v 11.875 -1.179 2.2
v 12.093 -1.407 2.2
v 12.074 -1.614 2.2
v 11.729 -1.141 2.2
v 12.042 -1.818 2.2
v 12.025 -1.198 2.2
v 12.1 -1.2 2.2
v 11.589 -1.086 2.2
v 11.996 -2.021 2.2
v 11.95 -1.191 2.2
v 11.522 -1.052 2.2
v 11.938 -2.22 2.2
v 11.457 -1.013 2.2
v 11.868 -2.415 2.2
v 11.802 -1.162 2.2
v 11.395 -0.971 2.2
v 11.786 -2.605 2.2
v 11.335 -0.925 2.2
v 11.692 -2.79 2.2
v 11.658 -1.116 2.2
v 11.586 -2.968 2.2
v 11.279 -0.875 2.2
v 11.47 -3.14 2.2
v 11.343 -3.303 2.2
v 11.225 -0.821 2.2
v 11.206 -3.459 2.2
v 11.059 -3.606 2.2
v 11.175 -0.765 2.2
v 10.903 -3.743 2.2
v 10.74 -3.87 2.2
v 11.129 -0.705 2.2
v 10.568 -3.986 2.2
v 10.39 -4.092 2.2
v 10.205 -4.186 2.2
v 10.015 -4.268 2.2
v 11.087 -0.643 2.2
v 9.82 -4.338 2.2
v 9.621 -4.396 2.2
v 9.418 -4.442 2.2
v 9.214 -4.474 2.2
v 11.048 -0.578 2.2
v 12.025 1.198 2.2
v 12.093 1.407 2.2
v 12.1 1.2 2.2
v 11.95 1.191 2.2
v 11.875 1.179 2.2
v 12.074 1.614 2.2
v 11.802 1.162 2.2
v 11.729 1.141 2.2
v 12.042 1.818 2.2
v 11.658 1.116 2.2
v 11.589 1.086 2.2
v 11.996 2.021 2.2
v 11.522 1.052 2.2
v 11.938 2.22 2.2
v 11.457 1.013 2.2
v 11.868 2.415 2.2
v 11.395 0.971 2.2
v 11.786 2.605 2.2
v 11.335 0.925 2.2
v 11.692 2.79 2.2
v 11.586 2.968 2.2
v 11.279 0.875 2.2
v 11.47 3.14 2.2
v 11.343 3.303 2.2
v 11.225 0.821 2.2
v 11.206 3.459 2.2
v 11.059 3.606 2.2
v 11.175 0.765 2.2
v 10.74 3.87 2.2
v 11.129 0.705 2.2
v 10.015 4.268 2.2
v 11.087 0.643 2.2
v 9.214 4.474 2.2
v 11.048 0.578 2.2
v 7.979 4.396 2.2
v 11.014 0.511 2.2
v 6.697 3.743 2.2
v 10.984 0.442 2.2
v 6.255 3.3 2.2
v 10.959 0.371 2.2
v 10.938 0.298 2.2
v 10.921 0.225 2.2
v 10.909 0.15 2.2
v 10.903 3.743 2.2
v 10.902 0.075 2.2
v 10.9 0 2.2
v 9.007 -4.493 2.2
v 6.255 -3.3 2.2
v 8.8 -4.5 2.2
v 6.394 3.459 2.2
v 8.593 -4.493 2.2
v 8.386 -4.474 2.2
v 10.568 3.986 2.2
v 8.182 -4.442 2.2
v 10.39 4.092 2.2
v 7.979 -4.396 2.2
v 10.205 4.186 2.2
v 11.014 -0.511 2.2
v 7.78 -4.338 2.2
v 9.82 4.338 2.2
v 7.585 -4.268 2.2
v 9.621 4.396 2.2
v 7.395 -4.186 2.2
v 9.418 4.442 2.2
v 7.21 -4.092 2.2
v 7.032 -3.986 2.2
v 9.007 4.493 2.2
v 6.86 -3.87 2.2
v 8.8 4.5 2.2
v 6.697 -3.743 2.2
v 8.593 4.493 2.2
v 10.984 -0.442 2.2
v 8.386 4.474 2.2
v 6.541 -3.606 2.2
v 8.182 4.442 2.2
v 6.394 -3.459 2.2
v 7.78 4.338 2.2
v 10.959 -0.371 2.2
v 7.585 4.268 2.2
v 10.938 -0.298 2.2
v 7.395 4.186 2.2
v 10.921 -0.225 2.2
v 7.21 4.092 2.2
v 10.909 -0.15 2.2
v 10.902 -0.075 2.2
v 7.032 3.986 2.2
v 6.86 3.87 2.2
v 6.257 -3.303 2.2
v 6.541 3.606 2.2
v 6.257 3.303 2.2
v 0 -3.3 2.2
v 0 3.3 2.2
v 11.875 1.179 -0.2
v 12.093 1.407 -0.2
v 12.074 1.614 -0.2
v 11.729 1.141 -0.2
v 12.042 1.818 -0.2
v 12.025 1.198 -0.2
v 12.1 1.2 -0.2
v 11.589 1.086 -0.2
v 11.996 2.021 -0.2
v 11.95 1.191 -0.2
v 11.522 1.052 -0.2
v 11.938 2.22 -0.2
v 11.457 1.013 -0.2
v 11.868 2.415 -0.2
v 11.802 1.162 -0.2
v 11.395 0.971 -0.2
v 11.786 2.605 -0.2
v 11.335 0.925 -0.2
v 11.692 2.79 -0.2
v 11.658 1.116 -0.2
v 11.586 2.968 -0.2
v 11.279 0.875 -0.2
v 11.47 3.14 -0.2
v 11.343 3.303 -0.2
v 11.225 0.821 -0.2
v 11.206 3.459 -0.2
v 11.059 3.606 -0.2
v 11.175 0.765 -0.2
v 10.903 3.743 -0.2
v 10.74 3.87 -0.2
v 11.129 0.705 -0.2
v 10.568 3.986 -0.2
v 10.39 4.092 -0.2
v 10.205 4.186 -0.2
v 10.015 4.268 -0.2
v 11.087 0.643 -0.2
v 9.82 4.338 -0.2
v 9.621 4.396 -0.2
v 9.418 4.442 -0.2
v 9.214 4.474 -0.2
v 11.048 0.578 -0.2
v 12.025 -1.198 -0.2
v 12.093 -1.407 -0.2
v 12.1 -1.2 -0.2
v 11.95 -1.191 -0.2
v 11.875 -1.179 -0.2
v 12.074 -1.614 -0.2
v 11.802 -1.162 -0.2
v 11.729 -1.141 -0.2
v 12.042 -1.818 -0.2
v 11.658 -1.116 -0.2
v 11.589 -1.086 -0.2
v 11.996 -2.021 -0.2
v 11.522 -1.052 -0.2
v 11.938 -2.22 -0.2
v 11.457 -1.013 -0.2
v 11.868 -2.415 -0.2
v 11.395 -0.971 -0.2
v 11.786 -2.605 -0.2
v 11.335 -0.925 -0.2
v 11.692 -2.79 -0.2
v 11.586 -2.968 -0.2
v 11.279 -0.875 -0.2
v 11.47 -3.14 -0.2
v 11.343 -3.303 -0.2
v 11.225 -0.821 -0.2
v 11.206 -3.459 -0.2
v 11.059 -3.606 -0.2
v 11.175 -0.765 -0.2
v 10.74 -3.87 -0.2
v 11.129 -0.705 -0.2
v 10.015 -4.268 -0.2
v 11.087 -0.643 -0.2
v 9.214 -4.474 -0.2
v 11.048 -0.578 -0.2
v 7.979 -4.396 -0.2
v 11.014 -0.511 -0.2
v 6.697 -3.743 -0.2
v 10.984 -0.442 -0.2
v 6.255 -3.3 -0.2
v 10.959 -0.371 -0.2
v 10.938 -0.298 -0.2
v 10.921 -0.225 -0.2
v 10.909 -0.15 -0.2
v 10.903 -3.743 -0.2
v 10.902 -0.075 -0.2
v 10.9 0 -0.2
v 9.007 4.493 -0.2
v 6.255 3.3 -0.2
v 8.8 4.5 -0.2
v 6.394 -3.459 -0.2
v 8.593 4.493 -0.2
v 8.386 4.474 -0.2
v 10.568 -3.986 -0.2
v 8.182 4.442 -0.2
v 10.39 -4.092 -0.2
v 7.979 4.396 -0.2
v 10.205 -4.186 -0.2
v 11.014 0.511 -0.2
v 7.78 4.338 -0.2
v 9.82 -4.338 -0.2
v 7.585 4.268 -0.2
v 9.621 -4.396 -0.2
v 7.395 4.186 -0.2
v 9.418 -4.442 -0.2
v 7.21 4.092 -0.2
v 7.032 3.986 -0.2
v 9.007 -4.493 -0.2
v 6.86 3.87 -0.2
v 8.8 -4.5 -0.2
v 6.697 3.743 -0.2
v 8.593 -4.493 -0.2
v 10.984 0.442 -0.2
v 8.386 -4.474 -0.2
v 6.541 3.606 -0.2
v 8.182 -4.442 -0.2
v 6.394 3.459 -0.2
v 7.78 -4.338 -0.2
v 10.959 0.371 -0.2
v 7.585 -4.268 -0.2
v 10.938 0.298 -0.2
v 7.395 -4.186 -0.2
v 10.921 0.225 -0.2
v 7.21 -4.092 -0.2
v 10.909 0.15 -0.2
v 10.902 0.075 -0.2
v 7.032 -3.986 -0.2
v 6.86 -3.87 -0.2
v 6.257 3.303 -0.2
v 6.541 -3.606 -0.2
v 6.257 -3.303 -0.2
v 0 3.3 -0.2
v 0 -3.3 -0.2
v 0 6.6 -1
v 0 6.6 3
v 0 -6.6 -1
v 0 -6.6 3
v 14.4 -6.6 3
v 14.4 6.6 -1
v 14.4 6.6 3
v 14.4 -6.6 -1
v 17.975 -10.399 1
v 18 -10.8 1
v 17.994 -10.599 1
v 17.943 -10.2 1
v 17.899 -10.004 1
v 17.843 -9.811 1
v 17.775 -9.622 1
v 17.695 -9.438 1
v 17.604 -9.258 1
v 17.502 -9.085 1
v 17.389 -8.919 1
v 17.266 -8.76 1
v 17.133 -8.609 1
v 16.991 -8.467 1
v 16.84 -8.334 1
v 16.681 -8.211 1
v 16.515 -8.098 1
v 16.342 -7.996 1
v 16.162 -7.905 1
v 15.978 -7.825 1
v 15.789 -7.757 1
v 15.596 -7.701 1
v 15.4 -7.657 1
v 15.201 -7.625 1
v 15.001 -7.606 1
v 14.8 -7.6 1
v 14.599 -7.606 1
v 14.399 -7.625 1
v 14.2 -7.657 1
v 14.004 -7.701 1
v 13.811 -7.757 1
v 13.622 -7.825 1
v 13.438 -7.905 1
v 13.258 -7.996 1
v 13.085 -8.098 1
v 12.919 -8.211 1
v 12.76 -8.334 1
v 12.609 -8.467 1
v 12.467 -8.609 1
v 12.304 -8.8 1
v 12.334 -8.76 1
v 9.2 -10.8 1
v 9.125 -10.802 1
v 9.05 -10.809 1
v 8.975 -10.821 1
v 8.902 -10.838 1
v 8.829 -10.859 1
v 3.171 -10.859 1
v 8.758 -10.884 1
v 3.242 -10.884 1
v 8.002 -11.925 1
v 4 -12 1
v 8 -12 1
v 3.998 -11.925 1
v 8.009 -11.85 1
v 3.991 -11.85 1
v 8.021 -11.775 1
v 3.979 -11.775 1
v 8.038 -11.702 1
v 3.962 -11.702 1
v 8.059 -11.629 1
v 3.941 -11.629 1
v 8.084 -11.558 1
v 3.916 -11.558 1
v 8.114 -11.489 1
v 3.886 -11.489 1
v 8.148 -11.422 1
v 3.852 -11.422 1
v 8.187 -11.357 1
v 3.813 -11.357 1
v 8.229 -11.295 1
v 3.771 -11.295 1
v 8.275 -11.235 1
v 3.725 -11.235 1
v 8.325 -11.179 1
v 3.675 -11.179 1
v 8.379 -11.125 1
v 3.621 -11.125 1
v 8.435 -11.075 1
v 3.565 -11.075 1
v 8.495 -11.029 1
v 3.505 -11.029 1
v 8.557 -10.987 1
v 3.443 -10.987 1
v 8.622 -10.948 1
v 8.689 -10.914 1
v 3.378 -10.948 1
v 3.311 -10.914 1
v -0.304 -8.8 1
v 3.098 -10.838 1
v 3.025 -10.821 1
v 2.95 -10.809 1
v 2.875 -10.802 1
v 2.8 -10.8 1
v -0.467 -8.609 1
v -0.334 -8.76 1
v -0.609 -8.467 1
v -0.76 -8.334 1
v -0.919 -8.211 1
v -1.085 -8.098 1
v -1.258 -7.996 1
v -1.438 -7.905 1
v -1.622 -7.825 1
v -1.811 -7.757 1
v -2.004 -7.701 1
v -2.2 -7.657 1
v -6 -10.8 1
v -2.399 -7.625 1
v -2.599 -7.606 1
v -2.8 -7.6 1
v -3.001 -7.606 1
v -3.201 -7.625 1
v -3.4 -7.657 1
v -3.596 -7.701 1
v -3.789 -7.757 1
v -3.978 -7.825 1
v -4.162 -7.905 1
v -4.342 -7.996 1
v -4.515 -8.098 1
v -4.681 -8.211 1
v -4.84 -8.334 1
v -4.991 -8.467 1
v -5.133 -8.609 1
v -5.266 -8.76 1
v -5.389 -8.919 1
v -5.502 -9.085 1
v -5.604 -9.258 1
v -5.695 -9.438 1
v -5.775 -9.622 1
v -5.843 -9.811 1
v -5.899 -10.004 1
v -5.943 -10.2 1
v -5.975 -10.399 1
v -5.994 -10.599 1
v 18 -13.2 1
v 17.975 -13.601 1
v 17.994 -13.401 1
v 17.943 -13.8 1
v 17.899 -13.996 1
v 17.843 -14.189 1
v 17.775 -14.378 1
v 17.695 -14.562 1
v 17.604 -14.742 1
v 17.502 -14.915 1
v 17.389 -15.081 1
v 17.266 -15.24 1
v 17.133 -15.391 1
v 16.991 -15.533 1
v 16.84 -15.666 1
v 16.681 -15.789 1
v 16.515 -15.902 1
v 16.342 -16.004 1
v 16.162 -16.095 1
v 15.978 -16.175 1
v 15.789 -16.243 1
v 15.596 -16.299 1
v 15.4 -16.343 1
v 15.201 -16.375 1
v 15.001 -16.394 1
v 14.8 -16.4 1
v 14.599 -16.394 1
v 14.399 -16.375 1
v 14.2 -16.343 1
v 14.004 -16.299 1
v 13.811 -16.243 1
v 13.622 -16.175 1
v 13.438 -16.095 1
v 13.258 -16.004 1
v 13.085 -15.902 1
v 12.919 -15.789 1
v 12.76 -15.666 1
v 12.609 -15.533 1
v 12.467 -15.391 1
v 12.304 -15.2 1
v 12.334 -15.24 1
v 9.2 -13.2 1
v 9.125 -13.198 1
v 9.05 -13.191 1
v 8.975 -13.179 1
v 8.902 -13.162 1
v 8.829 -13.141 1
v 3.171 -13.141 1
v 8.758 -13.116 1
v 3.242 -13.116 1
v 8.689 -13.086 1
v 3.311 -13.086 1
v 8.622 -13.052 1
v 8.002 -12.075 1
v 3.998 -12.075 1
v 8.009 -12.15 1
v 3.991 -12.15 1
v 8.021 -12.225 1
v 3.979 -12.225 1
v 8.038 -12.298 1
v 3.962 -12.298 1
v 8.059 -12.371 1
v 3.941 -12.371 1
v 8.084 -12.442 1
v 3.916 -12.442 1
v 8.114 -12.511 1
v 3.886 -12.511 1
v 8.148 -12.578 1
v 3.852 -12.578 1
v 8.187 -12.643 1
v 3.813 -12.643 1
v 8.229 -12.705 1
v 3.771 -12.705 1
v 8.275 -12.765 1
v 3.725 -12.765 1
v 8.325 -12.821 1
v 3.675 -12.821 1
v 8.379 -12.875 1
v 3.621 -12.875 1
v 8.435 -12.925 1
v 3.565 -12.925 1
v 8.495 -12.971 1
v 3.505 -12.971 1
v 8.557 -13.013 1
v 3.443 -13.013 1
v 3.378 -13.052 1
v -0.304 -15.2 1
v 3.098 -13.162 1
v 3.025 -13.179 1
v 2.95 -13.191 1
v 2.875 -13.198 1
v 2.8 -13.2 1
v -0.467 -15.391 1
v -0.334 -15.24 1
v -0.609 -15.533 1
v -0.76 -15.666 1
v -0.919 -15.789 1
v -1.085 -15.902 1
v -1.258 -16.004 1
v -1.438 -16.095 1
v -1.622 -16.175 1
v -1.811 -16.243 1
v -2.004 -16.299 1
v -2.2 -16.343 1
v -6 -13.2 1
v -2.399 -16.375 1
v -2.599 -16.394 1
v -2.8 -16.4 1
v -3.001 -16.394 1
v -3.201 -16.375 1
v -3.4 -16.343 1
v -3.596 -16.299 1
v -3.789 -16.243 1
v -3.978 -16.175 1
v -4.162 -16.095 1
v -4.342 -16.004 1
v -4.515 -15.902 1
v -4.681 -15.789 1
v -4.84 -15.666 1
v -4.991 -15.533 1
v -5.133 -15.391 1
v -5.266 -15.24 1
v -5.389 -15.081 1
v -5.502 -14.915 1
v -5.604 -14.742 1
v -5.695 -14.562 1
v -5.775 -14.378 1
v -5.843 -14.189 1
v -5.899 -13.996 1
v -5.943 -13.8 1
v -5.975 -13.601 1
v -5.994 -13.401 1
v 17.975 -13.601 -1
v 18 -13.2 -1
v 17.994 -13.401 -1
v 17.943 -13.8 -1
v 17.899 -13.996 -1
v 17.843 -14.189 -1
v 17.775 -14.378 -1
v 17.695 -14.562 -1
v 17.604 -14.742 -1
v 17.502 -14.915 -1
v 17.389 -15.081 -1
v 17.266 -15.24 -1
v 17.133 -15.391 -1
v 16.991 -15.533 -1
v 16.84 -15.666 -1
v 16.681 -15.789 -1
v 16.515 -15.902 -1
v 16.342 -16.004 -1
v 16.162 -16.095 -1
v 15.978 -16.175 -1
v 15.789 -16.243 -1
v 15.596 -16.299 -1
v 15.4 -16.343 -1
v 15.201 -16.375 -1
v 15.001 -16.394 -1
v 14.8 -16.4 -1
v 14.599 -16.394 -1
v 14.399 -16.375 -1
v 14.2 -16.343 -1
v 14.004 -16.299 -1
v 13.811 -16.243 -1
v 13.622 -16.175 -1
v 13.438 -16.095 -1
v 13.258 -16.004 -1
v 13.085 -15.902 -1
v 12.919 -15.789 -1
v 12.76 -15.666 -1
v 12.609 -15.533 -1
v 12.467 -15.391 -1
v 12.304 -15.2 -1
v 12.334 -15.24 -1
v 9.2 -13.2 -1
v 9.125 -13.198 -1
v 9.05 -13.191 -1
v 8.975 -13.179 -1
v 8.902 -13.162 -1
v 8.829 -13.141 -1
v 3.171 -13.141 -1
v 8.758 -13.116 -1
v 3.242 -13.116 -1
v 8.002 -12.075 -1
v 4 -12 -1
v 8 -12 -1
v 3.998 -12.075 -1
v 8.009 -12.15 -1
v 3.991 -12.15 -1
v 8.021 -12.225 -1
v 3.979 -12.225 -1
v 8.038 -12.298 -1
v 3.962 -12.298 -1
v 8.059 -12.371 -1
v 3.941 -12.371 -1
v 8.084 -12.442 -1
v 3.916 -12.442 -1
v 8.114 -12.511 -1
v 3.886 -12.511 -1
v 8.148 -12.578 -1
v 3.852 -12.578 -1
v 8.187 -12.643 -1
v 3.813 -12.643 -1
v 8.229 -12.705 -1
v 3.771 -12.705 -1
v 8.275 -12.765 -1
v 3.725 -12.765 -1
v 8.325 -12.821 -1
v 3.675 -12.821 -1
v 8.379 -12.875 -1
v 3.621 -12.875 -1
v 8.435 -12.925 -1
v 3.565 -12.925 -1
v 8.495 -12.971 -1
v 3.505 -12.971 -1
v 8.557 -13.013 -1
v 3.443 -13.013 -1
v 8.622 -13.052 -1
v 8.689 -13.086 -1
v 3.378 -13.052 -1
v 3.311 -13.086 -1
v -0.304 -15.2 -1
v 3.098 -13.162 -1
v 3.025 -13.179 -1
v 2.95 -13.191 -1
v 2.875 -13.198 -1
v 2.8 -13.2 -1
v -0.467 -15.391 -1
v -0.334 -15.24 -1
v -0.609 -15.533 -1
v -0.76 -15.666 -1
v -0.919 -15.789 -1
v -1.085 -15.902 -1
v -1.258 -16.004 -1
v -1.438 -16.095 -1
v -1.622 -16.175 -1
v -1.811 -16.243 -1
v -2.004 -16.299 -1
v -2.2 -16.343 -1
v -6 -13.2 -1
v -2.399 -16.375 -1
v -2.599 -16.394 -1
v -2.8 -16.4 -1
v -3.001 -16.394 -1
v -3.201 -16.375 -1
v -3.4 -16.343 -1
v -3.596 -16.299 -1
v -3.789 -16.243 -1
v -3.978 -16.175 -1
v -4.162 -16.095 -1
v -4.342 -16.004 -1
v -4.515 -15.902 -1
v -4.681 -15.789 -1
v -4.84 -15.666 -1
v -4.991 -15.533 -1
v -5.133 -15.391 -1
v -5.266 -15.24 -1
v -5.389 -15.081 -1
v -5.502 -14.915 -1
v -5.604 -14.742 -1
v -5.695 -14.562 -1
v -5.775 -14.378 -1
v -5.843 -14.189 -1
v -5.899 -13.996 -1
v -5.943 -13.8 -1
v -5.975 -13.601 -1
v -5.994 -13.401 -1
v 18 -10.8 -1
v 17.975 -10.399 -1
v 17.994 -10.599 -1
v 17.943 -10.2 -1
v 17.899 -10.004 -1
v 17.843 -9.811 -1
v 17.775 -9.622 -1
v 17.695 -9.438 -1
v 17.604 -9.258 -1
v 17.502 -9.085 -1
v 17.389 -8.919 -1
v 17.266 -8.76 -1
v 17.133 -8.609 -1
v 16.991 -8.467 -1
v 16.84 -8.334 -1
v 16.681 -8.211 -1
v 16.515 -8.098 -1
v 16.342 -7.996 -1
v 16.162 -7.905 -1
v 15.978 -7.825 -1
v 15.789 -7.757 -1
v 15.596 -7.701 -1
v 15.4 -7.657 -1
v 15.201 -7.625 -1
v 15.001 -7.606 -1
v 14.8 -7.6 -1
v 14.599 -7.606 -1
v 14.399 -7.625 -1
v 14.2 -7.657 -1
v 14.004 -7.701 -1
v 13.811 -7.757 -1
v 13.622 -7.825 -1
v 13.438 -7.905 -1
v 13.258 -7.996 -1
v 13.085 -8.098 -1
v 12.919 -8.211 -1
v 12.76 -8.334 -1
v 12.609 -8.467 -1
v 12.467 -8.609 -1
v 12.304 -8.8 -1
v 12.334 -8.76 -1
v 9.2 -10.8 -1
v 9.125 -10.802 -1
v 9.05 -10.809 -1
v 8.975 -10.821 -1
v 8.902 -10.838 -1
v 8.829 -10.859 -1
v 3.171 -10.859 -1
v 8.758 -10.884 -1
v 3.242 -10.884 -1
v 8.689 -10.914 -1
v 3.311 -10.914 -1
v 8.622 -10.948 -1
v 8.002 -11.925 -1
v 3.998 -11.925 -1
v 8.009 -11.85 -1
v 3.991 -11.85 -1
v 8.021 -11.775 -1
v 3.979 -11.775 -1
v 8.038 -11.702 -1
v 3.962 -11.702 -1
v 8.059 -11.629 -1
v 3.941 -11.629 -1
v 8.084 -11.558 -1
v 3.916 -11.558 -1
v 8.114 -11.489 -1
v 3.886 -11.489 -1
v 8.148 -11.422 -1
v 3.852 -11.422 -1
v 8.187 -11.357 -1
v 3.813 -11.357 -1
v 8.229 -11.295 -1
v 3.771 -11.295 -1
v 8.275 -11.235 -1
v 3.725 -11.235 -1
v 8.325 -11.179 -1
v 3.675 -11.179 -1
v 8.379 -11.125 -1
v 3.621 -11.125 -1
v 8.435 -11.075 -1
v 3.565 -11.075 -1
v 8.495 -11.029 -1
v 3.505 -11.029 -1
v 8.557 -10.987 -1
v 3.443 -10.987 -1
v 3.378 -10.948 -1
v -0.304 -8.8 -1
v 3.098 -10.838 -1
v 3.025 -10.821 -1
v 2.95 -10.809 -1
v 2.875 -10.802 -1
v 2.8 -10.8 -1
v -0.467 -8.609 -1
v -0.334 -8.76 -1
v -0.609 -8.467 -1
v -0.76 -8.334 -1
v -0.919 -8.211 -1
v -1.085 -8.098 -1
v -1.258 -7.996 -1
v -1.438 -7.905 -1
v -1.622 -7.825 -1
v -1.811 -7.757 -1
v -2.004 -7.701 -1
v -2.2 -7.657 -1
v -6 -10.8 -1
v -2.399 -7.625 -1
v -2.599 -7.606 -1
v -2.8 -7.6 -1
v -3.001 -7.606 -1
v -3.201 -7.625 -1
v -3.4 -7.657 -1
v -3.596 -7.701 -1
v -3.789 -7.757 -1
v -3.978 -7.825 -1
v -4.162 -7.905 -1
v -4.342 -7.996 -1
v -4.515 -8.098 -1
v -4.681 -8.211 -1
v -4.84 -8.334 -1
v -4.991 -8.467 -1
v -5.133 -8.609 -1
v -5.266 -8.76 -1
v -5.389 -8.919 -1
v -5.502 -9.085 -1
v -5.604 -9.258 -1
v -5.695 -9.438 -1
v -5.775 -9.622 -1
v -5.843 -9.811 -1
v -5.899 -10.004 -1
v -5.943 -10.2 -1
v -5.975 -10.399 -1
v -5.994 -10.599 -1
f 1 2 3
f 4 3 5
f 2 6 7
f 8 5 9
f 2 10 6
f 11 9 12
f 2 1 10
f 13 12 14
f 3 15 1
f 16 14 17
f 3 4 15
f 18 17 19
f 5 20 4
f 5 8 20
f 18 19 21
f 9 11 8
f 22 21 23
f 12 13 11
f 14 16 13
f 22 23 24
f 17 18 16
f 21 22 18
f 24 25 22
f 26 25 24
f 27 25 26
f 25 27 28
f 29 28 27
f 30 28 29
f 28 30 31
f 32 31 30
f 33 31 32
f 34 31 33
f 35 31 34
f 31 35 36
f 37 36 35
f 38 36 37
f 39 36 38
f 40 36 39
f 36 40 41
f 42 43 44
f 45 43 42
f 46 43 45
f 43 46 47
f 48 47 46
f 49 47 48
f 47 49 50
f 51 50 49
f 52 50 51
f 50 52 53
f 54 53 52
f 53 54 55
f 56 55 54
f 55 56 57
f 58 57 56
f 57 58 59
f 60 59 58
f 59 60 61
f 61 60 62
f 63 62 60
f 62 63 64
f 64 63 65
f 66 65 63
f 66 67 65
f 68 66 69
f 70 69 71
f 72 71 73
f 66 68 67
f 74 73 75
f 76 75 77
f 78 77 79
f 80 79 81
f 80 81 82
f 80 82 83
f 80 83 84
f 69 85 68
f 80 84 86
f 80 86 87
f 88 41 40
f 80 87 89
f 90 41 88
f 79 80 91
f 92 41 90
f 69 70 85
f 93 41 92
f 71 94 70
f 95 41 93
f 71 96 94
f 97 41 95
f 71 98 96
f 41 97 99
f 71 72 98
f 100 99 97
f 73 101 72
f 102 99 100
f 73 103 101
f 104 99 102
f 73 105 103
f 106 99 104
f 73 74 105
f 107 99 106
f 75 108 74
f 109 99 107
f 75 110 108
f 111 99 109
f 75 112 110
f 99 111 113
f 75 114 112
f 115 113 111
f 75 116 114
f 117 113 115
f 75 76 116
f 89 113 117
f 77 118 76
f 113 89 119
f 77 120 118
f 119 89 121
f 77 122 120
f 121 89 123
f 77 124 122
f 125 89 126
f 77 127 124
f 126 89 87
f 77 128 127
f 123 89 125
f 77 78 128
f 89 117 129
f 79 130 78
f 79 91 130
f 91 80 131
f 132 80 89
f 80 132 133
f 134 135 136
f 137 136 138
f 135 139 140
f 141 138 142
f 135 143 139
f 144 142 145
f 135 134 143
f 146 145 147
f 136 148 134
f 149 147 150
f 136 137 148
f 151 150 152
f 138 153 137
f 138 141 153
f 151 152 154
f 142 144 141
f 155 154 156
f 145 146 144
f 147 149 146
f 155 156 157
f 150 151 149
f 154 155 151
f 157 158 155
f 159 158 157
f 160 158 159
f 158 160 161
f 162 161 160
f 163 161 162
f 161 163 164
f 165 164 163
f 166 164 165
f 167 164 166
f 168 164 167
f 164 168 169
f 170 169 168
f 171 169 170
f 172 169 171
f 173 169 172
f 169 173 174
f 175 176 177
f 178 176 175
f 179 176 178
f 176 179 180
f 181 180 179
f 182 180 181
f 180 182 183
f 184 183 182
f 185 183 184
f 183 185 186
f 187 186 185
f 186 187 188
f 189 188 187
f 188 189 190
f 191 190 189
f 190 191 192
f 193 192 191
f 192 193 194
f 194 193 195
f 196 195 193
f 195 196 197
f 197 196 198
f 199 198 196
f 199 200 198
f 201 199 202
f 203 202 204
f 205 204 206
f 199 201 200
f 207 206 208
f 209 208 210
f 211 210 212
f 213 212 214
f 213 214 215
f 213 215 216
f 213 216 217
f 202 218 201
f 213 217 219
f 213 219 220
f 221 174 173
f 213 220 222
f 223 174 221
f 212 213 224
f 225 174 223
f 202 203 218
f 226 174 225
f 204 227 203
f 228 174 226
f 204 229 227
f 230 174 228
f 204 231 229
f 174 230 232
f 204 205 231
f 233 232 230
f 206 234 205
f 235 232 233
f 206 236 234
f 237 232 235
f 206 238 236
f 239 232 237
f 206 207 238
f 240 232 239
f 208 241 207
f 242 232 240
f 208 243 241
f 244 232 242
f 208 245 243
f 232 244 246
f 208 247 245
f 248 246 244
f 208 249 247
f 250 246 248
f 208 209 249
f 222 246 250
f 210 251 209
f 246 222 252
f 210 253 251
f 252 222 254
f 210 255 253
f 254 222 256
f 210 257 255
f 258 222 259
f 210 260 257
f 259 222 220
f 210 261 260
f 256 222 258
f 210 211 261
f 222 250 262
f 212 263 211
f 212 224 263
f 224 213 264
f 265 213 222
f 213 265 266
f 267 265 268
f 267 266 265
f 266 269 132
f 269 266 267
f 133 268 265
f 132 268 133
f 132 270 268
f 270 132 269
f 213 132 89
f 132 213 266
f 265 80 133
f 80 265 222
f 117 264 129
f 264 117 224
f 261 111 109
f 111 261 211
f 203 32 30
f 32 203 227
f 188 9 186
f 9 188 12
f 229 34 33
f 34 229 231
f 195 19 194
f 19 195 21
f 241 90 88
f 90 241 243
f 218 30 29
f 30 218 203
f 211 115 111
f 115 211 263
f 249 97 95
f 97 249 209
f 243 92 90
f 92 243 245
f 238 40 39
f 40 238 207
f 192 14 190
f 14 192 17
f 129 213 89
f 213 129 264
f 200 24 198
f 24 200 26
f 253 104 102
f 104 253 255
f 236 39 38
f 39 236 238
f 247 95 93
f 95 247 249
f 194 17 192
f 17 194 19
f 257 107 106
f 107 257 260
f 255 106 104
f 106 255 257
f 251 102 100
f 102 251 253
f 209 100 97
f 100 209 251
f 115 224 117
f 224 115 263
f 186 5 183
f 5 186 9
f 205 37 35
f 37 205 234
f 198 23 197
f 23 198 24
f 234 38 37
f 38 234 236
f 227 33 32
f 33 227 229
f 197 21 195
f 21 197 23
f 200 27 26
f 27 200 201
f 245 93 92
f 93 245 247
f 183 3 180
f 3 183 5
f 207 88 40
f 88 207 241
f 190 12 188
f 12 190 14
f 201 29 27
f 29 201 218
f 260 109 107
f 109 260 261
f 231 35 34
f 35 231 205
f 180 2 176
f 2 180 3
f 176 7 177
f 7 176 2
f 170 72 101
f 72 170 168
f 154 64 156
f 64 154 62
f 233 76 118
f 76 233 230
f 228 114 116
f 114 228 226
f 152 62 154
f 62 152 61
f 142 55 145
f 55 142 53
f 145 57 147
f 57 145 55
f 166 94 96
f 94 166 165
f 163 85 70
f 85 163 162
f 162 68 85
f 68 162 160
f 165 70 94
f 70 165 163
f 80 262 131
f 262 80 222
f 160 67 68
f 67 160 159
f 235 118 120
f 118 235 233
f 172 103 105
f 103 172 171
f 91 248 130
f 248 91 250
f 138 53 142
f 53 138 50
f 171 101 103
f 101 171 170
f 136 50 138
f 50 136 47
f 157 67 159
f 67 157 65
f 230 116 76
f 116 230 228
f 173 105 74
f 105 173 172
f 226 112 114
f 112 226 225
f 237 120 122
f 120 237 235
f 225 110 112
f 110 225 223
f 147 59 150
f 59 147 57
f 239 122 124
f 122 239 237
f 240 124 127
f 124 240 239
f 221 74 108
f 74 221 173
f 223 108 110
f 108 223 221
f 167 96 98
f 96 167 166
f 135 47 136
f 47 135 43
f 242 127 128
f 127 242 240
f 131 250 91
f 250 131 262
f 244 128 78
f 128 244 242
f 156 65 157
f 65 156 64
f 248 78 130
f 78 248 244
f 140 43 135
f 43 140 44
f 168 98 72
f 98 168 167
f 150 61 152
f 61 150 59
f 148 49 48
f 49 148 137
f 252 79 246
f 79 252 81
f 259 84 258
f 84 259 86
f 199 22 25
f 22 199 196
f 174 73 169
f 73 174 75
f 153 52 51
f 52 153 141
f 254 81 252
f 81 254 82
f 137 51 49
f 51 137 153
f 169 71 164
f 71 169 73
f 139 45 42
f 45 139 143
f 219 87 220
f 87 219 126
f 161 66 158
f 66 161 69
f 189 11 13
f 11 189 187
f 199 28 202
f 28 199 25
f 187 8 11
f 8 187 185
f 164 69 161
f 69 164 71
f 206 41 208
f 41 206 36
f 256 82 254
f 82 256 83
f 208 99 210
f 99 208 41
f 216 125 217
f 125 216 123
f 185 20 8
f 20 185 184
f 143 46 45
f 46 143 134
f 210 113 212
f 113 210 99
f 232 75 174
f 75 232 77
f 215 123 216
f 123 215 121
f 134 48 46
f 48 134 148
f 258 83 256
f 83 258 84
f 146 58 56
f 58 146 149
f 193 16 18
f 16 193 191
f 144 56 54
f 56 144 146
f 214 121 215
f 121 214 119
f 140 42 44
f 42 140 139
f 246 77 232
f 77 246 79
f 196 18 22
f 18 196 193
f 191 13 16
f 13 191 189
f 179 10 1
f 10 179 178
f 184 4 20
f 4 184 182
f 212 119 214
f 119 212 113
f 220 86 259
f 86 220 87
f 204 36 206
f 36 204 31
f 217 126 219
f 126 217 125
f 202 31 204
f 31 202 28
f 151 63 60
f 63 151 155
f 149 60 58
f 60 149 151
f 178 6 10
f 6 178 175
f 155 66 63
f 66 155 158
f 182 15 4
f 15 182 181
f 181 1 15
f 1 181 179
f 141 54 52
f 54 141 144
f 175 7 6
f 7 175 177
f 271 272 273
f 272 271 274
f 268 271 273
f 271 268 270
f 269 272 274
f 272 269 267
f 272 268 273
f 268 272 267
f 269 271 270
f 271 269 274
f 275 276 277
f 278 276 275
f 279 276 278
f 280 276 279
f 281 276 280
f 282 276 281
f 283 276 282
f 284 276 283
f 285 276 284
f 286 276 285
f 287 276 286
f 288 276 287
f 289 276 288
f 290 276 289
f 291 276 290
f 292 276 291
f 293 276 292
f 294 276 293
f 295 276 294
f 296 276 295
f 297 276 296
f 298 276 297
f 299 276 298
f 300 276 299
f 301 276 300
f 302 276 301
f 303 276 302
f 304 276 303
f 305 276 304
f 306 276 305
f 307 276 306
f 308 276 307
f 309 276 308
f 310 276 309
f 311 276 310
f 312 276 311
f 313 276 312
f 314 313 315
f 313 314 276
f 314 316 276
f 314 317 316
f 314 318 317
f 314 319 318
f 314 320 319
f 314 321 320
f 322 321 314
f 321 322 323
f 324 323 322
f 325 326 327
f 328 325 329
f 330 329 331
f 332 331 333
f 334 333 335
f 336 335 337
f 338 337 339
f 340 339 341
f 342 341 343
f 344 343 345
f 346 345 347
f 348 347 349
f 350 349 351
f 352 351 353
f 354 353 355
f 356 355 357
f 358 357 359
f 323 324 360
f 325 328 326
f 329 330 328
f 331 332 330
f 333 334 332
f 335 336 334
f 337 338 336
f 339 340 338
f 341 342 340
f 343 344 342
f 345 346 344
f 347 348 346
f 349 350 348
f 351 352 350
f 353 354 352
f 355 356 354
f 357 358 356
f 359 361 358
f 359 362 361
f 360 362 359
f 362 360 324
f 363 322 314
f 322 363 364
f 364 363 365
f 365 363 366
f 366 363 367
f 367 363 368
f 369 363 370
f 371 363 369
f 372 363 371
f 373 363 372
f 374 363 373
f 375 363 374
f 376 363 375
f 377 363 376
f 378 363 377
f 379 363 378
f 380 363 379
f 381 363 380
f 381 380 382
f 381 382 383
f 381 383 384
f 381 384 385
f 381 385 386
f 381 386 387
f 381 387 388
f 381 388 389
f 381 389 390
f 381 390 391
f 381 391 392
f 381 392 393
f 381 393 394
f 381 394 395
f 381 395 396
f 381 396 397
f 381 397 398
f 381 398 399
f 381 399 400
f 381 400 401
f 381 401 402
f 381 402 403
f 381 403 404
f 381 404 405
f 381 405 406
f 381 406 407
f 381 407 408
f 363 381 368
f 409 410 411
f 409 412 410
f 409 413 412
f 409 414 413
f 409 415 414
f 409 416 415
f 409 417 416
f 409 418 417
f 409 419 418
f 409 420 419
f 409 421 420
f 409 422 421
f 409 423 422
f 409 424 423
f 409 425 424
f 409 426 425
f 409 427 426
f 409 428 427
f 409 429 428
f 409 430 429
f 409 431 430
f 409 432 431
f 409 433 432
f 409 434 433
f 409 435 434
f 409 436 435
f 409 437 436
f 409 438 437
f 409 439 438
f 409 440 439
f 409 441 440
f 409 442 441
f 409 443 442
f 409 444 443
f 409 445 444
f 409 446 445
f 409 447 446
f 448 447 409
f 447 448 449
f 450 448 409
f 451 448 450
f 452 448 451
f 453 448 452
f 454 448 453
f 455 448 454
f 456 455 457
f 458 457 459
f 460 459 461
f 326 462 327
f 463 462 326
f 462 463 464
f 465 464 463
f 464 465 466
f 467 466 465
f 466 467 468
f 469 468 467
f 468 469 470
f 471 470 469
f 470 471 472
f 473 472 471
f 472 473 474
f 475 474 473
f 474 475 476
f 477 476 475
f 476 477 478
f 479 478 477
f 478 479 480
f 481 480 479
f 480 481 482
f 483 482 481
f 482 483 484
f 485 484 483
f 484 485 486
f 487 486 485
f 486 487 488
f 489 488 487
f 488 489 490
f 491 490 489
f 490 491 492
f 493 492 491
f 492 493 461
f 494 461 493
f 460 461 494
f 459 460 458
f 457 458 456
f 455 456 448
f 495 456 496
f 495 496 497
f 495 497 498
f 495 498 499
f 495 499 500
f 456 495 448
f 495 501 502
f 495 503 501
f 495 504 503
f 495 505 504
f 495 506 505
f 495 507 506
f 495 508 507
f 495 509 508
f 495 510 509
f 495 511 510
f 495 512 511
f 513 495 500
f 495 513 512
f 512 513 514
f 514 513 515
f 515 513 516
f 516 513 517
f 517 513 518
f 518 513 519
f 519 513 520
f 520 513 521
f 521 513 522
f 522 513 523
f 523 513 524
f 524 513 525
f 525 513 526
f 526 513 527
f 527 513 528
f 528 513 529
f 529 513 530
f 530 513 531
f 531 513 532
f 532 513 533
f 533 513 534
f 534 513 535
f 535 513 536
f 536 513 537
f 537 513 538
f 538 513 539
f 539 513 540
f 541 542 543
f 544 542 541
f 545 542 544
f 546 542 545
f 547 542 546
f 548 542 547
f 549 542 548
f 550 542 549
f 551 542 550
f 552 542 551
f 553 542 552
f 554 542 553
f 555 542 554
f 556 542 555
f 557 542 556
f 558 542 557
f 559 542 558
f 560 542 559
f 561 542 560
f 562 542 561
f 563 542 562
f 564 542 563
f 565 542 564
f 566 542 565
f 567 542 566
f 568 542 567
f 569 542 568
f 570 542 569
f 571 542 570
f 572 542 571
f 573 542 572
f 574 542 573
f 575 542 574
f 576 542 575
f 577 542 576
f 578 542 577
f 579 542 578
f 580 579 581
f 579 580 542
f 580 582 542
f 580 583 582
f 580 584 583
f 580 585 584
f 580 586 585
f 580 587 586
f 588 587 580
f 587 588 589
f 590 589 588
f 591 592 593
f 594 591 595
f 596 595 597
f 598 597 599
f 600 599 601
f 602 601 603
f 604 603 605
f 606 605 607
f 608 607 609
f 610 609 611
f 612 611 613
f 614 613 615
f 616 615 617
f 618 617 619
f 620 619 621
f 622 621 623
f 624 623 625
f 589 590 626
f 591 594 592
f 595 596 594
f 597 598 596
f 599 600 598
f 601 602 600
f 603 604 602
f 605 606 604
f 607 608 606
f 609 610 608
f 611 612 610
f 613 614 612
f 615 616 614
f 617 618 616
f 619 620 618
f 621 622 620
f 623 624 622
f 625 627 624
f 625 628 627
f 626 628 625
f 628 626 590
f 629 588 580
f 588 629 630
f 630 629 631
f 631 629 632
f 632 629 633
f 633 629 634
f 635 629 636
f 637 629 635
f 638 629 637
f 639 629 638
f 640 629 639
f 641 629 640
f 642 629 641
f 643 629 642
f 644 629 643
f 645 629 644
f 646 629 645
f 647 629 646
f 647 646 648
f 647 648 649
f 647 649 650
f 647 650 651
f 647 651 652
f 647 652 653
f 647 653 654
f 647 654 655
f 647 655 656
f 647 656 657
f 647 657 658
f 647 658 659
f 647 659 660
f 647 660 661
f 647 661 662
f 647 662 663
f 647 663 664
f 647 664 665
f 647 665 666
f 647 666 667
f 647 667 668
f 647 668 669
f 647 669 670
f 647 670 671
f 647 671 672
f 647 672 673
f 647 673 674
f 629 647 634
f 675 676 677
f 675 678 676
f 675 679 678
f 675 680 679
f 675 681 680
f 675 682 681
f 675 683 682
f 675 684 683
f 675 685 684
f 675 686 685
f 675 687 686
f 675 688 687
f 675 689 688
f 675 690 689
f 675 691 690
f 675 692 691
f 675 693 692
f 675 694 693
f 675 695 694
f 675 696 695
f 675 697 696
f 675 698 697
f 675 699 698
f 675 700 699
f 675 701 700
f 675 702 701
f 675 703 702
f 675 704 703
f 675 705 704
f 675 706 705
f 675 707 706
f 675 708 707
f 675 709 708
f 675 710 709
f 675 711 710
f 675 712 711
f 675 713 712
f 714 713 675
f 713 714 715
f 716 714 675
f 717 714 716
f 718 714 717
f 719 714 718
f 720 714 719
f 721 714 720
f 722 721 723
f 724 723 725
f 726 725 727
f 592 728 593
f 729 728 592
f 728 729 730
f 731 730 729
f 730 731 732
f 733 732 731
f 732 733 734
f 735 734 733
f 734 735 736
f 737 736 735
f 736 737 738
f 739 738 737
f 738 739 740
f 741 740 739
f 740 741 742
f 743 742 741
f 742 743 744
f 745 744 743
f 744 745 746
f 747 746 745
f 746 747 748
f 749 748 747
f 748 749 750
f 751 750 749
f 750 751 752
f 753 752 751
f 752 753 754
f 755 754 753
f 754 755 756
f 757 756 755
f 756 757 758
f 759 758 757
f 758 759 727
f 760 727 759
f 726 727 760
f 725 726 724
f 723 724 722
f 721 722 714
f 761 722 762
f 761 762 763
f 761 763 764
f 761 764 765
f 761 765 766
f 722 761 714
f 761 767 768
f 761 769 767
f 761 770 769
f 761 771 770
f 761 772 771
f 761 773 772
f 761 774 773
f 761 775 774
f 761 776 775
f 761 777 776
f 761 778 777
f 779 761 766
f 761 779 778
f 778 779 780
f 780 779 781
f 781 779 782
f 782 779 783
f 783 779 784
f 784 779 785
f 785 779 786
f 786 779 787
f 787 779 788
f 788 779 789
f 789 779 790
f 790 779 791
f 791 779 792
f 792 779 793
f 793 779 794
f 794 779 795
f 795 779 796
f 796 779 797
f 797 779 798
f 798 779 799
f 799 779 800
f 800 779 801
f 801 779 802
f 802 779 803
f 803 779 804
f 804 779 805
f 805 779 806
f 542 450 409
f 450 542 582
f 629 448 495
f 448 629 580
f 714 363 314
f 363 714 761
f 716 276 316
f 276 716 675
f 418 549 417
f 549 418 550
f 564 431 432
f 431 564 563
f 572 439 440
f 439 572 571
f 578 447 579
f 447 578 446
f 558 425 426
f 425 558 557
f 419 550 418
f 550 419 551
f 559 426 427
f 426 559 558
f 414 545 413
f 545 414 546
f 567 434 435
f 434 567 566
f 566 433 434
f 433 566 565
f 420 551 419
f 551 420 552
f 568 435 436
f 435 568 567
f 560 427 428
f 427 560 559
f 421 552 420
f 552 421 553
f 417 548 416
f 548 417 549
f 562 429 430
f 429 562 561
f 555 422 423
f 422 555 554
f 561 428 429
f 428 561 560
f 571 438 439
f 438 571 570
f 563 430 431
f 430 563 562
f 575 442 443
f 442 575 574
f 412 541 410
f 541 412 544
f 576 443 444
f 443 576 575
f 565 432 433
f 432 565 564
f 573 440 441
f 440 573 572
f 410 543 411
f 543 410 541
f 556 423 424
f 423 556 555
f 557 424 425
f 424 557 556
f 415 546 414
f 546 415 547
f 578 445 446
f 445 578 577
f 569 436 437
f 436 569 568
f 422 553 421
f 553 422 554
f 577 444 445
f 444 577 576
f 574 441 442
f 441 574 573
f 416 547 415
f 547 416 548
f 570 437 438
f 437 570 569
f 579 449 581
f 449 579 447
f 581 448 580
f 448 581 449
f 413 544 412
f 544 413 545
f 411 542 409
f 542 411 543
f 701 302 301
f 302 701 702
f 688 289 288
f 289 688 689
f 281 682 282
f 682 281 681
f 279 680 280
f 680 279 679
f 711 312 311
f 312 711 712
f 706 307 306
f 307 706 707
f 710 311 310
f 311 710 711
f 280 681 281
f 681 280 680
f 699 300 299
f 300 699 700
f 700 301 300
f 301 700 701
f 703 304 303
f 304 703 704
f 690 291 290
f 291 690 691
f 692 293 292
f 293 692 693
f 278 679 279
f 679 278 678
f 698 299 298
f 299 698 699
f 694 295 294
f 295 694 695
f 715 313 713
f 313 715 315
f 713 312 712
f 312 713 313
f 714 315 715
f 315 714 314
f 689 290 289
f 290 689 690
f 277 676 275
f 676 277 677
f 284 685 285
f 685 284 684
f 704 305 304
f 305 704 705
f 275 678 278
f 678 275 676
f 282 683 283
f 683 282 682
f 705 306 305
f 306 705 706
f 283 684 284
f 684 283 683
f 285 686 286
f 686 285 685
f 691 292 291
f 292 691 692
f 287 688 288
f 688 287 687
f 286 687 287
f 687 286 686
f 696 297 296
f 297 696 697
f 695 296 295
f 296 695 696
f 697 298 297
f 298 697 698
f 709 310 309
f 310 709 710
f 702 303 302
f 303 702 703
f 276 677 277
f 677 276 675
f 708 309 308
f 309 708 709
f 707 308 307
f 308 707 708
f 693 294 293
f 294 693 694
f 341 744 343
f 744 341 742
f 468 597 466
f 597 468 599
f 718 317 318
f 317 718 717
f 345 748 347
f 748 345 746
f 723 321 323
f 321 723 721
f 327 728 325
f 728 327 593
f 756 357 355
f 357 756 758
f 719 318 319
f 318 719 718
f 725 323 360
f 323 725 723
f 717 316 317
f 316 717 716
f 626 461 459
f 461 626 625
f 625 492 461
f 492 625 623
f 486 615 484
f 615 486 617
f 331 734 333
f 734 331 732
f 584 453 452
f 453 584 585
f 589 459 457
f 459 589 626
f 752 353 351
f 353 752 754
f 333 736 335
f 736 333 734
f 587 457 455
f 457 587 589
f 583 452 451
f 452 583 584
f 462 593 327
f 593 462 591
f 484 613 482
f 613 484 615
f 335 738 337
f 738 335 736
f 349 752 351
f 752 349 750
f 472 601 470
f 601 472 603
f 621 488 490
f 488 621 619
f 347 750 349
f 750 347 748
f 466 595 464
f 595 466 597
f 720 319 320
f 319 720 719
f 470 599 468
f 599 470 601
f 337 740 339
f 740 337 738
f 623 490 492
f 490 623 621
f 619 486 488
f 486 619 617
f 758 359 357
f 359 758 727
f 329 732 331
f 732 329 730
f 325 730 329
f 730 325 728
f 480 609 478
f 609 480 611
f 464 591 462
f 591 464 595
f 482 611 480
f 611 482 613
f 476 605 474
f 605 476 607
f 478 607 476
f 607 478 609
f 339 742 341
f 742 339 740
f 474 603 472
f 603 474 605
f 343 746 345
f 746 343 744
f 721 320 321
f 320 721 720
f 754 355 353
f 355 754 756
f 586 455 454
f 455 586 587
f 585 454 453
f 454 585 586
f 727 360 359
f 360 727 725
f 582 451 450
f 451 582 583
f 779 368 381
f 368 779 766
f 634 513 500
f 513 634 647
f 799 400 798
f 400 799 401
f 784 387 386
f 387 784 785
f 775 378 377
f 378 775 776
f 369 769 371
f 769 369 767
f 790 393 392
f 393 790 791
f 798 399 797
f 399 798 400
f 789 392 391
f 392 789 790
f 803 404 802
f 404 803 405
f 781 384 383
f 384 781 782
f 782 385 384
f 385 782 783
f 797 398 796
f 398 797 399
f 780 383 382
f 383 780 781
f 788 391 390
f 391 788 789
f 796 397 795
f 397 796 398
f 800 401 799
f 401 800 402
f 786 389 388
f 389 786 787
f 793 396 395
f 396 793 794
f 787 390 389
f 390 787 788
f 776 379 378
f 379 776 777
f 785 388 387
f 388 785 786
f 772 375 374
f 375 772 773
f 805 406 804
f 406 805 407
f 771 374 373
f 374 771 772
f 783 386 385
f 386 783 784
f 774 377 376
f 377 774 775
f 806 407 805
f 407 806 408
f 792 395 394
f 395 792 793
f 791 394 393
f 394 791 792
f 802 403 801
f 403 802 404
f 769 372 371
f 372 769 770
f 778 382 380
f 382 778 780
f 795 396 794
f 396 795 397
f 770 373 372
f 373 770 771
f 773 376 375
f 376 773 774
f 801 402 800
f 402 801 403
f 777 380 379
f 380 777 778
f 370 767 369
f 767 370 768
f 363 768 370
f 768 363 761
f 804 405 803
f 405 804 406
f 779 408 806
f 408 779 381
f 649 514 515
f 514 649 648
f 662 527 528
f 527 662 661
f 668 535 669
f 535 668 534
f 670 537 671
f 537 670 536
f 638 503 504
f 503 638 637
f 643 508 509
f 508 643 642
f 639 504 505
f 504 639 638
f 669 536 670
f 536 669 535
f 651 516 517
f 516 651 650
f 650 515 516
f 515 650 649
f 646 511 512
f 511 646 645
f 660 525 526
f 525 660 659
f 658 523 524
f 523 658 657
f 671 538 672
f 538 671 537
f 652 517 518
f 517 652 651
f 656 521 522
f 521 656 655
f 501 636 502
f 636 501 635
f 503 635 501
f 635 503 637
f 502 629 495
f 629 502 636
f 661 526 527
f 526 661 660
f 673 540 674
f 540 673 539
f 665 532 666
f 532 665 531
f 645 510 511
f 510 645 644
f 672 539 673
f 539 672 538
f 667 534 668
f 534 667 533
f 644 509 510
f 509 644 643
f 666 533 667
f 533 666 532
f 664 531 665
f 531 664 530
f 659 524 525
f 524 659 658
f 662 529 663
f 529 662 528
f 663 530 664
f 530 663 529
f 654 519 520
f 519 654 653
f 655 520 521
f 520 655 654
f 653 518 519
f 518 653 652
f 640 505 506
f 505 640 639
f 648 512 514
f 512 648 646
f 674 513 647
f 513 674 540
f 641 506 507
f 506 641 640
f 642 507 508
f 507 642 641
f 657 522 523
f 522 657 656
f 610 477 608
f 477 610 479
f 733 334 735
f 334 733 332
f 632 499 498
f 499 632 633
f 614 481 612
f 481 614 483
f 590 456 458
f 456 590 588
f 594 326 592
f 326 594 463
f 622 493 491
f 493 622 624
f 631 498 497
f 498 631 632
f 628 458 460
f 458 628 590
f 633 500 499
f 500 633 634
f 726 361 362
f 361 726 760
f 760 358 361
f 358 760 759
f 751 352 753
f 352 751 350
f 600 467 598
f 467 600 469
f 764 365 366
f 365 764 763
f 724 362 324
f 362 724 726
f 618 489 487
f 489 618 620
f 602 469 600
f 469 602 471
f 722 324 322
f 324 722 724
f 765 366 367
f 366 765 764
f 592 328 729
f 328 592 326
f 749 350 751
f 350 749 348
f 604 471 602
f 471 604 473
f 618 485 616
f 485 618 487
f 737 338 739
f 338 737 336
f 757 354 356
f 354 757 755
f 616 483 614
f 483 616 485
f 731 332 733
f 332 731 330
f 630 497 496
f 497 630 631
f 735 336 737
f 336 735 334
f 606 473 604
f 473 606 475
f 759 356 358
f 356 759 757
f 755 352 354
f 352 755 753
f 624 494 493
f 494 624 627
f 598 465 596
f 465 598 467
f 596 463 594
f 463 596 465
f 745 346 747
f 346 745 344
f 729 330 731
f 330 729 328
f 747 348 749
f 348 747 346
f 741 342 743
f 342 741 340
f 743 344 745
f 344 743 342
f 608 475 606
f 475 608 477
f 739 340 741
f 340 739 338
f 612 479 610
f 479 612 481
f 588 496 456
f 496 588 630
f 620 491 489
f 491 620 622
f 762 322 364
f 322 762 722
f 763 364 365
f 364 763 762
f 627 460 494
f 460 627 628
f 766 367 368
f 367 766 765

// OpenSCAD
//Test Clip Hinges that can be 3D printed

//Strength
//Too much and it breaks
//Too little and it doesn't clip
//Strength increases with cross section of the beam
//	Dz *Ty
//Strength decreases with length of the beam
//	LGx
//Strength increases with size of the grip
//	Gy


//Test 1
//Dz=5, Ty=2, LGx=50, Gy=2, Dy=6
//Fitting is good, it could be a little tighter on the head
//The ratio Gy/Gx grip needs to be steeper to make good contact
//It's very weak
//Strenght = Dz*Ty/LGx = 0.2mm
//Gy=2mm Strength = 0.4 mm2

//Test 2
//Increase Strength
//Steeper grip
//Dz=5, Ty=2, LGx=20, Gy=1, Dy=6
//Strength = Gy *Dz*Ty/LGx = 1 *5*2 /20 = 0.5 mm2
//Feedback
//still too weak, the grip is too little, gap is too wide

//Test 3
//Increase strength, increase grip, reduce gap, make full sleeve
//Dz=5, Ty=2, LGx=15, Gy=1.5, Dy=4
//Strength = Gy *Dz*Ty/LGx = 1.5 *5*2 /15 = 1.0 mm2

//TEST4
//Double sided 
//Much better! Now I can print the tiny clips at maximum strenght and precision
//They are super fast to print
Dz=3;
Ty=1.5;
LGx=10;
Gy=1.0;
Dy=3;

//TEST5 ROUND CLIPS with doub
//iH=2, iT=2, iL=15, iG=1, iA=2
//Much better!
//I can remove the aperture as parameter and leave it 2*Gap
//Side slack is much looser than vertical slack
//v_slack = 0.4 h_slack = 0.1
//Make three tests
//iH=2, iT=2, iL=15, iG=1 excellent tollerance, easy to remove
//iH=2, iT=2, iL=12, iG=1 excellent tollerance, hard to remove, aperture should be a tiny bit larger
//iH=2, iT=2, iL=12, iG=1.2 very hard to enter, impossible to remove. more aperture.

module cube_translate(size_vector, translate_vector)
{
    translate(translate_vector)
    cube(size_vector);
}

module hinge_triangle_up( Dz, Ty, LGx, Gx, Gy )
{
	//Gx hieght of the grip cannot exceed 2*Ty thickness
	//Dz = Z height of the hinge
	//Ty = Thickness of the hinge
	
	//HARDNESS OF THE HINGE
	//Hardness increases with the surface Dz*Ty
	//Hardness decreases with Length LGx
	linear_extrude(Dz)
	polygon
	(
		points=
		[
			//Bottom Left
			[0.0,0.0],
			//Thickenss of the hinge
			[0.0, Ty],
			//Start of the triangular bump
			[LGx -Gx, Ty],
			//Tip of the bump
			[LGx, Ty+Gy],
			//Tip of the hinge
			[LGx+1.5*Gx, Ty -0.5*Gy],
			//Tip base of the hinge
			[LGx+1.5*Gx, 0],
		],
		paths=
		[
			[0,1,2,3,4,5]
		],
		convexity=1
	);	
}

module hinge_triangle_down( Dz, Ty, LGx, Gx, Gy )
{
	//Flip and keep origin to the base of the long side
	translate([0,0,Dz])
	rotate([0,180,-180])
	hinge_triangle_up(Dz, Ty, LGx, Gx, Gy);
}

module hinge_male(Dz, Ty, LGx, Gy, Dy )
{
	//
	Gx = Dy/4;

	linear_extrude(Dz)
	polygon
	(
		points=
		[
			[0.0, -Dy/2],
			[0.0, Dy/2],
			[Dy, Dy/2],
			[Dy/4, 0],
			[Dy, -Dy/2],

		],
		paths=
		[
			[0,1,2,3,4]
		],
		convexity=1
	);	

	translate([0,Dy/2,0])
	hinge_triangle_up(Dz, Ty, LGx, Gx, Gy);

	translate([0,-Dy/2,0])
	hinge_triangle_down(Dz, Ty, LGx, Gx, Gy);
}

module hinge_female(Dz, Ty, LGx, Gy, Dy )
{
	//Male hinges with additional slack
	y_slack = 0.5;
	//
	Gx = Dy/4+y_slack/3;
	//Conserve the tips
	translate([0,Dy/2+y_slack/2,0])
	hinge_triangle_up(Dz, Ty, LGx, Gx, Gy);
	translate([0,-Dy/2-y_slack/2,0])
	hinge_triangle_down(Dz, Ty, LGx, Gx, Gy);
	//Add a box to cut out the space between hinges
	//translate([0,-Dy/2-y_slack/2,0])
	//cube([LGx+1.5*Gx,Dy+y_slack,Dz]);
	//Subtract a ribbon that leaves a triangle at the end
	linear_extrude(Dz)
	polygon
	(
		points=
		[
			[0.0, -Dy/2-y_slack/2],
			[0.0, Dy/2+y_slack/2],
			[LGx +1.5*Gx, Dy/2+y_slack/2],
			[LGx -1.5*Gx, 0.0],
			[LGx +1.5*Gx, -Dy/2-y_slack/2],
		],
		paths=
		[
			[0,1,2,3,4]
		],
		convexity=1
	);	
}

//cube_translate([1, 2, 3], [4, 5, 6]);

//long_hinge(10, 100, 5, 3, 1 );

//hinge_triangle_up( 10, 3, 50, 2, 6 );
//hinge_triangle_down( 10, 3, 50, 2, 6 );

module test_hinge_male()
{
	cube_translate([5,20,5],[-5,-10,0]);
	hinge_male( Dz=5, Ty=2, LGx=15, Gy=1.5, Dy=4 );
}

module test_hinge_female()
{
	LGx = 15;
	cube_translate([5,20,5],[0,-10,5]);

	difference()
	{
		cube_translate([LGx*1.2, 20, 5],[0, -10, 0]);
		hinge_female( Dz=5, Ty=2, LGx=15, Gy=1.5, Dy=4 );
	}
}

//Make a wall with embedded clips
module wall_double_clips( iDz, iTy, iLGx, iGy, iDy, ia_wall, in_female_clips )
{
	cube_translate( ia_wall,[0,0,0]);

}


//test_hinge_male();
//test_hinge_female();

module double_male_hinge( iDz, iTy, iLGx, iGy, iDy )
{
	hinge_male( Dz=iDz, Ty=iTy, LGx=iLGx, Gy=iGy, Dy=iDy );
	rotate([-180,-180,0])
	hinge_male( Dz=iDz, Ty=iTy, LGx=iLGx, Gy=iGy, Dy=iDy );
}

//translate([0,-30,0])
//double_male_hinge( iDz=2.5, iTy=2, iLGx=12, iGy=1, iDy=3 );

//Draw a pie
//iZ			depth of the pie
//iD			Diameter of the pie
//i_angle_start	
//i_angle_end
//	start angle and end angle decide the orientation and size of the slice
module pie( iZ, iD, i_angle_start, i_angle_end )
{
	angle_total = abs(i_angle_end -i_angle_start);


	translate([0,0,iZ/2])
	rotate([0,0,-180-i_angle_start])
	rotate_extrude( angle=angle_total, $fn=100)
	translate([iD/4,0,0])
	square([iD/2,iZ], center=true);


}

//Clip with round profile and compliant fork
//iH	Depth of the clip on the Z axis. Increases strength
//iT	Thickness of the clip arms on the Y axis. Increases strength
//iL	Total length of the clip on X axis. Decreases strength
//iG	Grip, how far the round element protrudes outward on Y axis
//		Forces the clips inward during insertion
//		Retain clips once inserted
//		Cannot exceed Pitch or the clips will interfere and the clip won't enter
//iA	Aperture, gap between the two clips. Need to accomodate flexing and gap when inserting
module clip_round( iH, iT, iL, iG )
{
	//Aperture is twice the gap
	A = 2*iG;
	//Pitch between arms
	P = A+iT;
	//Bottom Arm of the clip
	cube_translate([iL-iG-iT, iT, iH],[0, -iT/2-P/2, 0]);
	//Top Arm of the clip
	cube_translate([iL-iG-iT, iT, iH],[0, -iT/2+P/2, 0]);
	//Bottom Round Clip
	translate([iL-iG-iT,+iT/2-P/2,0])
	pie(iH, (iT+iG)*2, 0, 180);
	//Top Round Clip
	translate([iL-iG-iT,-iT/2+P/2,0])
	pie(iH, (iT+iG)*2, 180, 360);
}

//Base clips, with an element joining the two clips
module clip_round_male( iH, iT, iL, iG, iA )
{
	difference()
	{
		union()
		{
			clip_round(iH, iT, iL, iG);
			//Join the two arms
			cube_translate([iT+2*iG/2,2*iG, iH],[0, -2*iG/2, 0]);
		}
		//Extrude from the joinage to make it smooth		
		translate([iT+2*iG/2,0,0])
		pie(iH, 2*iG, 90, 270);
	}
}

//Create an element with male round clip on both sides
module double_clip_round_male( iH, iT, iL, iG, iA )
{

	clip_round_male( iH, iT, iL, iG, iA );
	rotate([-180,-180,0])
	clip_round_male( iH, iT, iL, iG, iA );
}

//Meant to be extruded from a volume
//Added tollerances to make sure male and female of same parameters mate
//base clip with added tollerances
//Add an element to aid with clip retention
module clip_round_female( iH, iT, iL, iG )
{
	
	v_slack = 0.4;
	h_slack = 0.1;
	Hslack = iH+v_slack;
	Lslack = iL+h_slack;
	Tslack = iT+h_slack;
	translate([0,0,-v_slack/2])
	union()
	{
		//Base clips
		clip_round(Hslack, Tslack, Lslack, iG);
		
		difference()
		{
			//Subtract space between arms
			cube_translate([Lslack, 2*iG, Hslack],[0, -2*iG/2, 0]);
			//Leve wedge to help with retention
			translate([Lslack,0,0])
			pie(Hslack, 2*iG, 90, 270);
		}
	}
}




//Make a volume with a female clip slot inside
module test_clip_round_female(iH, iT, iL, iG)
{
	//Depth of the walls below and above the slot
	Zwall = 1;
	//Cube size to enclose the female slot
	Lcube = iL*1.2;
	Wcube = (2*iT+2*iG+2*iG)*1.5;
	Hcube = iH +2*Zwall;
	
	difference()
	{
		cube_translate([Lcube, Wcube, Hcube],[0, -Wcube/2, -Zwall]);
		clip_round_female( iH=iH, iT=iT, iL=iL, iG=iG);
	}
}

H=2;
T=2;
L=12;
G=1.2;

//Test clip inside the female clip
//clip_round_male( iH=2, iT=2, iL=15, iG=1, iA=2);
//Test double clip inside the female clip
//double_clip_round_male( iH=H, iT=T, iL=L, iG=G );
//Test block with a female clip
test_clip_round_female( iH=H, iT=T, iL=L, iG=G );
//Double clip for printing
translate([6,-12,-1])
double_clip_round_male( iH=H, iT=T, iL=L, iG=G );
